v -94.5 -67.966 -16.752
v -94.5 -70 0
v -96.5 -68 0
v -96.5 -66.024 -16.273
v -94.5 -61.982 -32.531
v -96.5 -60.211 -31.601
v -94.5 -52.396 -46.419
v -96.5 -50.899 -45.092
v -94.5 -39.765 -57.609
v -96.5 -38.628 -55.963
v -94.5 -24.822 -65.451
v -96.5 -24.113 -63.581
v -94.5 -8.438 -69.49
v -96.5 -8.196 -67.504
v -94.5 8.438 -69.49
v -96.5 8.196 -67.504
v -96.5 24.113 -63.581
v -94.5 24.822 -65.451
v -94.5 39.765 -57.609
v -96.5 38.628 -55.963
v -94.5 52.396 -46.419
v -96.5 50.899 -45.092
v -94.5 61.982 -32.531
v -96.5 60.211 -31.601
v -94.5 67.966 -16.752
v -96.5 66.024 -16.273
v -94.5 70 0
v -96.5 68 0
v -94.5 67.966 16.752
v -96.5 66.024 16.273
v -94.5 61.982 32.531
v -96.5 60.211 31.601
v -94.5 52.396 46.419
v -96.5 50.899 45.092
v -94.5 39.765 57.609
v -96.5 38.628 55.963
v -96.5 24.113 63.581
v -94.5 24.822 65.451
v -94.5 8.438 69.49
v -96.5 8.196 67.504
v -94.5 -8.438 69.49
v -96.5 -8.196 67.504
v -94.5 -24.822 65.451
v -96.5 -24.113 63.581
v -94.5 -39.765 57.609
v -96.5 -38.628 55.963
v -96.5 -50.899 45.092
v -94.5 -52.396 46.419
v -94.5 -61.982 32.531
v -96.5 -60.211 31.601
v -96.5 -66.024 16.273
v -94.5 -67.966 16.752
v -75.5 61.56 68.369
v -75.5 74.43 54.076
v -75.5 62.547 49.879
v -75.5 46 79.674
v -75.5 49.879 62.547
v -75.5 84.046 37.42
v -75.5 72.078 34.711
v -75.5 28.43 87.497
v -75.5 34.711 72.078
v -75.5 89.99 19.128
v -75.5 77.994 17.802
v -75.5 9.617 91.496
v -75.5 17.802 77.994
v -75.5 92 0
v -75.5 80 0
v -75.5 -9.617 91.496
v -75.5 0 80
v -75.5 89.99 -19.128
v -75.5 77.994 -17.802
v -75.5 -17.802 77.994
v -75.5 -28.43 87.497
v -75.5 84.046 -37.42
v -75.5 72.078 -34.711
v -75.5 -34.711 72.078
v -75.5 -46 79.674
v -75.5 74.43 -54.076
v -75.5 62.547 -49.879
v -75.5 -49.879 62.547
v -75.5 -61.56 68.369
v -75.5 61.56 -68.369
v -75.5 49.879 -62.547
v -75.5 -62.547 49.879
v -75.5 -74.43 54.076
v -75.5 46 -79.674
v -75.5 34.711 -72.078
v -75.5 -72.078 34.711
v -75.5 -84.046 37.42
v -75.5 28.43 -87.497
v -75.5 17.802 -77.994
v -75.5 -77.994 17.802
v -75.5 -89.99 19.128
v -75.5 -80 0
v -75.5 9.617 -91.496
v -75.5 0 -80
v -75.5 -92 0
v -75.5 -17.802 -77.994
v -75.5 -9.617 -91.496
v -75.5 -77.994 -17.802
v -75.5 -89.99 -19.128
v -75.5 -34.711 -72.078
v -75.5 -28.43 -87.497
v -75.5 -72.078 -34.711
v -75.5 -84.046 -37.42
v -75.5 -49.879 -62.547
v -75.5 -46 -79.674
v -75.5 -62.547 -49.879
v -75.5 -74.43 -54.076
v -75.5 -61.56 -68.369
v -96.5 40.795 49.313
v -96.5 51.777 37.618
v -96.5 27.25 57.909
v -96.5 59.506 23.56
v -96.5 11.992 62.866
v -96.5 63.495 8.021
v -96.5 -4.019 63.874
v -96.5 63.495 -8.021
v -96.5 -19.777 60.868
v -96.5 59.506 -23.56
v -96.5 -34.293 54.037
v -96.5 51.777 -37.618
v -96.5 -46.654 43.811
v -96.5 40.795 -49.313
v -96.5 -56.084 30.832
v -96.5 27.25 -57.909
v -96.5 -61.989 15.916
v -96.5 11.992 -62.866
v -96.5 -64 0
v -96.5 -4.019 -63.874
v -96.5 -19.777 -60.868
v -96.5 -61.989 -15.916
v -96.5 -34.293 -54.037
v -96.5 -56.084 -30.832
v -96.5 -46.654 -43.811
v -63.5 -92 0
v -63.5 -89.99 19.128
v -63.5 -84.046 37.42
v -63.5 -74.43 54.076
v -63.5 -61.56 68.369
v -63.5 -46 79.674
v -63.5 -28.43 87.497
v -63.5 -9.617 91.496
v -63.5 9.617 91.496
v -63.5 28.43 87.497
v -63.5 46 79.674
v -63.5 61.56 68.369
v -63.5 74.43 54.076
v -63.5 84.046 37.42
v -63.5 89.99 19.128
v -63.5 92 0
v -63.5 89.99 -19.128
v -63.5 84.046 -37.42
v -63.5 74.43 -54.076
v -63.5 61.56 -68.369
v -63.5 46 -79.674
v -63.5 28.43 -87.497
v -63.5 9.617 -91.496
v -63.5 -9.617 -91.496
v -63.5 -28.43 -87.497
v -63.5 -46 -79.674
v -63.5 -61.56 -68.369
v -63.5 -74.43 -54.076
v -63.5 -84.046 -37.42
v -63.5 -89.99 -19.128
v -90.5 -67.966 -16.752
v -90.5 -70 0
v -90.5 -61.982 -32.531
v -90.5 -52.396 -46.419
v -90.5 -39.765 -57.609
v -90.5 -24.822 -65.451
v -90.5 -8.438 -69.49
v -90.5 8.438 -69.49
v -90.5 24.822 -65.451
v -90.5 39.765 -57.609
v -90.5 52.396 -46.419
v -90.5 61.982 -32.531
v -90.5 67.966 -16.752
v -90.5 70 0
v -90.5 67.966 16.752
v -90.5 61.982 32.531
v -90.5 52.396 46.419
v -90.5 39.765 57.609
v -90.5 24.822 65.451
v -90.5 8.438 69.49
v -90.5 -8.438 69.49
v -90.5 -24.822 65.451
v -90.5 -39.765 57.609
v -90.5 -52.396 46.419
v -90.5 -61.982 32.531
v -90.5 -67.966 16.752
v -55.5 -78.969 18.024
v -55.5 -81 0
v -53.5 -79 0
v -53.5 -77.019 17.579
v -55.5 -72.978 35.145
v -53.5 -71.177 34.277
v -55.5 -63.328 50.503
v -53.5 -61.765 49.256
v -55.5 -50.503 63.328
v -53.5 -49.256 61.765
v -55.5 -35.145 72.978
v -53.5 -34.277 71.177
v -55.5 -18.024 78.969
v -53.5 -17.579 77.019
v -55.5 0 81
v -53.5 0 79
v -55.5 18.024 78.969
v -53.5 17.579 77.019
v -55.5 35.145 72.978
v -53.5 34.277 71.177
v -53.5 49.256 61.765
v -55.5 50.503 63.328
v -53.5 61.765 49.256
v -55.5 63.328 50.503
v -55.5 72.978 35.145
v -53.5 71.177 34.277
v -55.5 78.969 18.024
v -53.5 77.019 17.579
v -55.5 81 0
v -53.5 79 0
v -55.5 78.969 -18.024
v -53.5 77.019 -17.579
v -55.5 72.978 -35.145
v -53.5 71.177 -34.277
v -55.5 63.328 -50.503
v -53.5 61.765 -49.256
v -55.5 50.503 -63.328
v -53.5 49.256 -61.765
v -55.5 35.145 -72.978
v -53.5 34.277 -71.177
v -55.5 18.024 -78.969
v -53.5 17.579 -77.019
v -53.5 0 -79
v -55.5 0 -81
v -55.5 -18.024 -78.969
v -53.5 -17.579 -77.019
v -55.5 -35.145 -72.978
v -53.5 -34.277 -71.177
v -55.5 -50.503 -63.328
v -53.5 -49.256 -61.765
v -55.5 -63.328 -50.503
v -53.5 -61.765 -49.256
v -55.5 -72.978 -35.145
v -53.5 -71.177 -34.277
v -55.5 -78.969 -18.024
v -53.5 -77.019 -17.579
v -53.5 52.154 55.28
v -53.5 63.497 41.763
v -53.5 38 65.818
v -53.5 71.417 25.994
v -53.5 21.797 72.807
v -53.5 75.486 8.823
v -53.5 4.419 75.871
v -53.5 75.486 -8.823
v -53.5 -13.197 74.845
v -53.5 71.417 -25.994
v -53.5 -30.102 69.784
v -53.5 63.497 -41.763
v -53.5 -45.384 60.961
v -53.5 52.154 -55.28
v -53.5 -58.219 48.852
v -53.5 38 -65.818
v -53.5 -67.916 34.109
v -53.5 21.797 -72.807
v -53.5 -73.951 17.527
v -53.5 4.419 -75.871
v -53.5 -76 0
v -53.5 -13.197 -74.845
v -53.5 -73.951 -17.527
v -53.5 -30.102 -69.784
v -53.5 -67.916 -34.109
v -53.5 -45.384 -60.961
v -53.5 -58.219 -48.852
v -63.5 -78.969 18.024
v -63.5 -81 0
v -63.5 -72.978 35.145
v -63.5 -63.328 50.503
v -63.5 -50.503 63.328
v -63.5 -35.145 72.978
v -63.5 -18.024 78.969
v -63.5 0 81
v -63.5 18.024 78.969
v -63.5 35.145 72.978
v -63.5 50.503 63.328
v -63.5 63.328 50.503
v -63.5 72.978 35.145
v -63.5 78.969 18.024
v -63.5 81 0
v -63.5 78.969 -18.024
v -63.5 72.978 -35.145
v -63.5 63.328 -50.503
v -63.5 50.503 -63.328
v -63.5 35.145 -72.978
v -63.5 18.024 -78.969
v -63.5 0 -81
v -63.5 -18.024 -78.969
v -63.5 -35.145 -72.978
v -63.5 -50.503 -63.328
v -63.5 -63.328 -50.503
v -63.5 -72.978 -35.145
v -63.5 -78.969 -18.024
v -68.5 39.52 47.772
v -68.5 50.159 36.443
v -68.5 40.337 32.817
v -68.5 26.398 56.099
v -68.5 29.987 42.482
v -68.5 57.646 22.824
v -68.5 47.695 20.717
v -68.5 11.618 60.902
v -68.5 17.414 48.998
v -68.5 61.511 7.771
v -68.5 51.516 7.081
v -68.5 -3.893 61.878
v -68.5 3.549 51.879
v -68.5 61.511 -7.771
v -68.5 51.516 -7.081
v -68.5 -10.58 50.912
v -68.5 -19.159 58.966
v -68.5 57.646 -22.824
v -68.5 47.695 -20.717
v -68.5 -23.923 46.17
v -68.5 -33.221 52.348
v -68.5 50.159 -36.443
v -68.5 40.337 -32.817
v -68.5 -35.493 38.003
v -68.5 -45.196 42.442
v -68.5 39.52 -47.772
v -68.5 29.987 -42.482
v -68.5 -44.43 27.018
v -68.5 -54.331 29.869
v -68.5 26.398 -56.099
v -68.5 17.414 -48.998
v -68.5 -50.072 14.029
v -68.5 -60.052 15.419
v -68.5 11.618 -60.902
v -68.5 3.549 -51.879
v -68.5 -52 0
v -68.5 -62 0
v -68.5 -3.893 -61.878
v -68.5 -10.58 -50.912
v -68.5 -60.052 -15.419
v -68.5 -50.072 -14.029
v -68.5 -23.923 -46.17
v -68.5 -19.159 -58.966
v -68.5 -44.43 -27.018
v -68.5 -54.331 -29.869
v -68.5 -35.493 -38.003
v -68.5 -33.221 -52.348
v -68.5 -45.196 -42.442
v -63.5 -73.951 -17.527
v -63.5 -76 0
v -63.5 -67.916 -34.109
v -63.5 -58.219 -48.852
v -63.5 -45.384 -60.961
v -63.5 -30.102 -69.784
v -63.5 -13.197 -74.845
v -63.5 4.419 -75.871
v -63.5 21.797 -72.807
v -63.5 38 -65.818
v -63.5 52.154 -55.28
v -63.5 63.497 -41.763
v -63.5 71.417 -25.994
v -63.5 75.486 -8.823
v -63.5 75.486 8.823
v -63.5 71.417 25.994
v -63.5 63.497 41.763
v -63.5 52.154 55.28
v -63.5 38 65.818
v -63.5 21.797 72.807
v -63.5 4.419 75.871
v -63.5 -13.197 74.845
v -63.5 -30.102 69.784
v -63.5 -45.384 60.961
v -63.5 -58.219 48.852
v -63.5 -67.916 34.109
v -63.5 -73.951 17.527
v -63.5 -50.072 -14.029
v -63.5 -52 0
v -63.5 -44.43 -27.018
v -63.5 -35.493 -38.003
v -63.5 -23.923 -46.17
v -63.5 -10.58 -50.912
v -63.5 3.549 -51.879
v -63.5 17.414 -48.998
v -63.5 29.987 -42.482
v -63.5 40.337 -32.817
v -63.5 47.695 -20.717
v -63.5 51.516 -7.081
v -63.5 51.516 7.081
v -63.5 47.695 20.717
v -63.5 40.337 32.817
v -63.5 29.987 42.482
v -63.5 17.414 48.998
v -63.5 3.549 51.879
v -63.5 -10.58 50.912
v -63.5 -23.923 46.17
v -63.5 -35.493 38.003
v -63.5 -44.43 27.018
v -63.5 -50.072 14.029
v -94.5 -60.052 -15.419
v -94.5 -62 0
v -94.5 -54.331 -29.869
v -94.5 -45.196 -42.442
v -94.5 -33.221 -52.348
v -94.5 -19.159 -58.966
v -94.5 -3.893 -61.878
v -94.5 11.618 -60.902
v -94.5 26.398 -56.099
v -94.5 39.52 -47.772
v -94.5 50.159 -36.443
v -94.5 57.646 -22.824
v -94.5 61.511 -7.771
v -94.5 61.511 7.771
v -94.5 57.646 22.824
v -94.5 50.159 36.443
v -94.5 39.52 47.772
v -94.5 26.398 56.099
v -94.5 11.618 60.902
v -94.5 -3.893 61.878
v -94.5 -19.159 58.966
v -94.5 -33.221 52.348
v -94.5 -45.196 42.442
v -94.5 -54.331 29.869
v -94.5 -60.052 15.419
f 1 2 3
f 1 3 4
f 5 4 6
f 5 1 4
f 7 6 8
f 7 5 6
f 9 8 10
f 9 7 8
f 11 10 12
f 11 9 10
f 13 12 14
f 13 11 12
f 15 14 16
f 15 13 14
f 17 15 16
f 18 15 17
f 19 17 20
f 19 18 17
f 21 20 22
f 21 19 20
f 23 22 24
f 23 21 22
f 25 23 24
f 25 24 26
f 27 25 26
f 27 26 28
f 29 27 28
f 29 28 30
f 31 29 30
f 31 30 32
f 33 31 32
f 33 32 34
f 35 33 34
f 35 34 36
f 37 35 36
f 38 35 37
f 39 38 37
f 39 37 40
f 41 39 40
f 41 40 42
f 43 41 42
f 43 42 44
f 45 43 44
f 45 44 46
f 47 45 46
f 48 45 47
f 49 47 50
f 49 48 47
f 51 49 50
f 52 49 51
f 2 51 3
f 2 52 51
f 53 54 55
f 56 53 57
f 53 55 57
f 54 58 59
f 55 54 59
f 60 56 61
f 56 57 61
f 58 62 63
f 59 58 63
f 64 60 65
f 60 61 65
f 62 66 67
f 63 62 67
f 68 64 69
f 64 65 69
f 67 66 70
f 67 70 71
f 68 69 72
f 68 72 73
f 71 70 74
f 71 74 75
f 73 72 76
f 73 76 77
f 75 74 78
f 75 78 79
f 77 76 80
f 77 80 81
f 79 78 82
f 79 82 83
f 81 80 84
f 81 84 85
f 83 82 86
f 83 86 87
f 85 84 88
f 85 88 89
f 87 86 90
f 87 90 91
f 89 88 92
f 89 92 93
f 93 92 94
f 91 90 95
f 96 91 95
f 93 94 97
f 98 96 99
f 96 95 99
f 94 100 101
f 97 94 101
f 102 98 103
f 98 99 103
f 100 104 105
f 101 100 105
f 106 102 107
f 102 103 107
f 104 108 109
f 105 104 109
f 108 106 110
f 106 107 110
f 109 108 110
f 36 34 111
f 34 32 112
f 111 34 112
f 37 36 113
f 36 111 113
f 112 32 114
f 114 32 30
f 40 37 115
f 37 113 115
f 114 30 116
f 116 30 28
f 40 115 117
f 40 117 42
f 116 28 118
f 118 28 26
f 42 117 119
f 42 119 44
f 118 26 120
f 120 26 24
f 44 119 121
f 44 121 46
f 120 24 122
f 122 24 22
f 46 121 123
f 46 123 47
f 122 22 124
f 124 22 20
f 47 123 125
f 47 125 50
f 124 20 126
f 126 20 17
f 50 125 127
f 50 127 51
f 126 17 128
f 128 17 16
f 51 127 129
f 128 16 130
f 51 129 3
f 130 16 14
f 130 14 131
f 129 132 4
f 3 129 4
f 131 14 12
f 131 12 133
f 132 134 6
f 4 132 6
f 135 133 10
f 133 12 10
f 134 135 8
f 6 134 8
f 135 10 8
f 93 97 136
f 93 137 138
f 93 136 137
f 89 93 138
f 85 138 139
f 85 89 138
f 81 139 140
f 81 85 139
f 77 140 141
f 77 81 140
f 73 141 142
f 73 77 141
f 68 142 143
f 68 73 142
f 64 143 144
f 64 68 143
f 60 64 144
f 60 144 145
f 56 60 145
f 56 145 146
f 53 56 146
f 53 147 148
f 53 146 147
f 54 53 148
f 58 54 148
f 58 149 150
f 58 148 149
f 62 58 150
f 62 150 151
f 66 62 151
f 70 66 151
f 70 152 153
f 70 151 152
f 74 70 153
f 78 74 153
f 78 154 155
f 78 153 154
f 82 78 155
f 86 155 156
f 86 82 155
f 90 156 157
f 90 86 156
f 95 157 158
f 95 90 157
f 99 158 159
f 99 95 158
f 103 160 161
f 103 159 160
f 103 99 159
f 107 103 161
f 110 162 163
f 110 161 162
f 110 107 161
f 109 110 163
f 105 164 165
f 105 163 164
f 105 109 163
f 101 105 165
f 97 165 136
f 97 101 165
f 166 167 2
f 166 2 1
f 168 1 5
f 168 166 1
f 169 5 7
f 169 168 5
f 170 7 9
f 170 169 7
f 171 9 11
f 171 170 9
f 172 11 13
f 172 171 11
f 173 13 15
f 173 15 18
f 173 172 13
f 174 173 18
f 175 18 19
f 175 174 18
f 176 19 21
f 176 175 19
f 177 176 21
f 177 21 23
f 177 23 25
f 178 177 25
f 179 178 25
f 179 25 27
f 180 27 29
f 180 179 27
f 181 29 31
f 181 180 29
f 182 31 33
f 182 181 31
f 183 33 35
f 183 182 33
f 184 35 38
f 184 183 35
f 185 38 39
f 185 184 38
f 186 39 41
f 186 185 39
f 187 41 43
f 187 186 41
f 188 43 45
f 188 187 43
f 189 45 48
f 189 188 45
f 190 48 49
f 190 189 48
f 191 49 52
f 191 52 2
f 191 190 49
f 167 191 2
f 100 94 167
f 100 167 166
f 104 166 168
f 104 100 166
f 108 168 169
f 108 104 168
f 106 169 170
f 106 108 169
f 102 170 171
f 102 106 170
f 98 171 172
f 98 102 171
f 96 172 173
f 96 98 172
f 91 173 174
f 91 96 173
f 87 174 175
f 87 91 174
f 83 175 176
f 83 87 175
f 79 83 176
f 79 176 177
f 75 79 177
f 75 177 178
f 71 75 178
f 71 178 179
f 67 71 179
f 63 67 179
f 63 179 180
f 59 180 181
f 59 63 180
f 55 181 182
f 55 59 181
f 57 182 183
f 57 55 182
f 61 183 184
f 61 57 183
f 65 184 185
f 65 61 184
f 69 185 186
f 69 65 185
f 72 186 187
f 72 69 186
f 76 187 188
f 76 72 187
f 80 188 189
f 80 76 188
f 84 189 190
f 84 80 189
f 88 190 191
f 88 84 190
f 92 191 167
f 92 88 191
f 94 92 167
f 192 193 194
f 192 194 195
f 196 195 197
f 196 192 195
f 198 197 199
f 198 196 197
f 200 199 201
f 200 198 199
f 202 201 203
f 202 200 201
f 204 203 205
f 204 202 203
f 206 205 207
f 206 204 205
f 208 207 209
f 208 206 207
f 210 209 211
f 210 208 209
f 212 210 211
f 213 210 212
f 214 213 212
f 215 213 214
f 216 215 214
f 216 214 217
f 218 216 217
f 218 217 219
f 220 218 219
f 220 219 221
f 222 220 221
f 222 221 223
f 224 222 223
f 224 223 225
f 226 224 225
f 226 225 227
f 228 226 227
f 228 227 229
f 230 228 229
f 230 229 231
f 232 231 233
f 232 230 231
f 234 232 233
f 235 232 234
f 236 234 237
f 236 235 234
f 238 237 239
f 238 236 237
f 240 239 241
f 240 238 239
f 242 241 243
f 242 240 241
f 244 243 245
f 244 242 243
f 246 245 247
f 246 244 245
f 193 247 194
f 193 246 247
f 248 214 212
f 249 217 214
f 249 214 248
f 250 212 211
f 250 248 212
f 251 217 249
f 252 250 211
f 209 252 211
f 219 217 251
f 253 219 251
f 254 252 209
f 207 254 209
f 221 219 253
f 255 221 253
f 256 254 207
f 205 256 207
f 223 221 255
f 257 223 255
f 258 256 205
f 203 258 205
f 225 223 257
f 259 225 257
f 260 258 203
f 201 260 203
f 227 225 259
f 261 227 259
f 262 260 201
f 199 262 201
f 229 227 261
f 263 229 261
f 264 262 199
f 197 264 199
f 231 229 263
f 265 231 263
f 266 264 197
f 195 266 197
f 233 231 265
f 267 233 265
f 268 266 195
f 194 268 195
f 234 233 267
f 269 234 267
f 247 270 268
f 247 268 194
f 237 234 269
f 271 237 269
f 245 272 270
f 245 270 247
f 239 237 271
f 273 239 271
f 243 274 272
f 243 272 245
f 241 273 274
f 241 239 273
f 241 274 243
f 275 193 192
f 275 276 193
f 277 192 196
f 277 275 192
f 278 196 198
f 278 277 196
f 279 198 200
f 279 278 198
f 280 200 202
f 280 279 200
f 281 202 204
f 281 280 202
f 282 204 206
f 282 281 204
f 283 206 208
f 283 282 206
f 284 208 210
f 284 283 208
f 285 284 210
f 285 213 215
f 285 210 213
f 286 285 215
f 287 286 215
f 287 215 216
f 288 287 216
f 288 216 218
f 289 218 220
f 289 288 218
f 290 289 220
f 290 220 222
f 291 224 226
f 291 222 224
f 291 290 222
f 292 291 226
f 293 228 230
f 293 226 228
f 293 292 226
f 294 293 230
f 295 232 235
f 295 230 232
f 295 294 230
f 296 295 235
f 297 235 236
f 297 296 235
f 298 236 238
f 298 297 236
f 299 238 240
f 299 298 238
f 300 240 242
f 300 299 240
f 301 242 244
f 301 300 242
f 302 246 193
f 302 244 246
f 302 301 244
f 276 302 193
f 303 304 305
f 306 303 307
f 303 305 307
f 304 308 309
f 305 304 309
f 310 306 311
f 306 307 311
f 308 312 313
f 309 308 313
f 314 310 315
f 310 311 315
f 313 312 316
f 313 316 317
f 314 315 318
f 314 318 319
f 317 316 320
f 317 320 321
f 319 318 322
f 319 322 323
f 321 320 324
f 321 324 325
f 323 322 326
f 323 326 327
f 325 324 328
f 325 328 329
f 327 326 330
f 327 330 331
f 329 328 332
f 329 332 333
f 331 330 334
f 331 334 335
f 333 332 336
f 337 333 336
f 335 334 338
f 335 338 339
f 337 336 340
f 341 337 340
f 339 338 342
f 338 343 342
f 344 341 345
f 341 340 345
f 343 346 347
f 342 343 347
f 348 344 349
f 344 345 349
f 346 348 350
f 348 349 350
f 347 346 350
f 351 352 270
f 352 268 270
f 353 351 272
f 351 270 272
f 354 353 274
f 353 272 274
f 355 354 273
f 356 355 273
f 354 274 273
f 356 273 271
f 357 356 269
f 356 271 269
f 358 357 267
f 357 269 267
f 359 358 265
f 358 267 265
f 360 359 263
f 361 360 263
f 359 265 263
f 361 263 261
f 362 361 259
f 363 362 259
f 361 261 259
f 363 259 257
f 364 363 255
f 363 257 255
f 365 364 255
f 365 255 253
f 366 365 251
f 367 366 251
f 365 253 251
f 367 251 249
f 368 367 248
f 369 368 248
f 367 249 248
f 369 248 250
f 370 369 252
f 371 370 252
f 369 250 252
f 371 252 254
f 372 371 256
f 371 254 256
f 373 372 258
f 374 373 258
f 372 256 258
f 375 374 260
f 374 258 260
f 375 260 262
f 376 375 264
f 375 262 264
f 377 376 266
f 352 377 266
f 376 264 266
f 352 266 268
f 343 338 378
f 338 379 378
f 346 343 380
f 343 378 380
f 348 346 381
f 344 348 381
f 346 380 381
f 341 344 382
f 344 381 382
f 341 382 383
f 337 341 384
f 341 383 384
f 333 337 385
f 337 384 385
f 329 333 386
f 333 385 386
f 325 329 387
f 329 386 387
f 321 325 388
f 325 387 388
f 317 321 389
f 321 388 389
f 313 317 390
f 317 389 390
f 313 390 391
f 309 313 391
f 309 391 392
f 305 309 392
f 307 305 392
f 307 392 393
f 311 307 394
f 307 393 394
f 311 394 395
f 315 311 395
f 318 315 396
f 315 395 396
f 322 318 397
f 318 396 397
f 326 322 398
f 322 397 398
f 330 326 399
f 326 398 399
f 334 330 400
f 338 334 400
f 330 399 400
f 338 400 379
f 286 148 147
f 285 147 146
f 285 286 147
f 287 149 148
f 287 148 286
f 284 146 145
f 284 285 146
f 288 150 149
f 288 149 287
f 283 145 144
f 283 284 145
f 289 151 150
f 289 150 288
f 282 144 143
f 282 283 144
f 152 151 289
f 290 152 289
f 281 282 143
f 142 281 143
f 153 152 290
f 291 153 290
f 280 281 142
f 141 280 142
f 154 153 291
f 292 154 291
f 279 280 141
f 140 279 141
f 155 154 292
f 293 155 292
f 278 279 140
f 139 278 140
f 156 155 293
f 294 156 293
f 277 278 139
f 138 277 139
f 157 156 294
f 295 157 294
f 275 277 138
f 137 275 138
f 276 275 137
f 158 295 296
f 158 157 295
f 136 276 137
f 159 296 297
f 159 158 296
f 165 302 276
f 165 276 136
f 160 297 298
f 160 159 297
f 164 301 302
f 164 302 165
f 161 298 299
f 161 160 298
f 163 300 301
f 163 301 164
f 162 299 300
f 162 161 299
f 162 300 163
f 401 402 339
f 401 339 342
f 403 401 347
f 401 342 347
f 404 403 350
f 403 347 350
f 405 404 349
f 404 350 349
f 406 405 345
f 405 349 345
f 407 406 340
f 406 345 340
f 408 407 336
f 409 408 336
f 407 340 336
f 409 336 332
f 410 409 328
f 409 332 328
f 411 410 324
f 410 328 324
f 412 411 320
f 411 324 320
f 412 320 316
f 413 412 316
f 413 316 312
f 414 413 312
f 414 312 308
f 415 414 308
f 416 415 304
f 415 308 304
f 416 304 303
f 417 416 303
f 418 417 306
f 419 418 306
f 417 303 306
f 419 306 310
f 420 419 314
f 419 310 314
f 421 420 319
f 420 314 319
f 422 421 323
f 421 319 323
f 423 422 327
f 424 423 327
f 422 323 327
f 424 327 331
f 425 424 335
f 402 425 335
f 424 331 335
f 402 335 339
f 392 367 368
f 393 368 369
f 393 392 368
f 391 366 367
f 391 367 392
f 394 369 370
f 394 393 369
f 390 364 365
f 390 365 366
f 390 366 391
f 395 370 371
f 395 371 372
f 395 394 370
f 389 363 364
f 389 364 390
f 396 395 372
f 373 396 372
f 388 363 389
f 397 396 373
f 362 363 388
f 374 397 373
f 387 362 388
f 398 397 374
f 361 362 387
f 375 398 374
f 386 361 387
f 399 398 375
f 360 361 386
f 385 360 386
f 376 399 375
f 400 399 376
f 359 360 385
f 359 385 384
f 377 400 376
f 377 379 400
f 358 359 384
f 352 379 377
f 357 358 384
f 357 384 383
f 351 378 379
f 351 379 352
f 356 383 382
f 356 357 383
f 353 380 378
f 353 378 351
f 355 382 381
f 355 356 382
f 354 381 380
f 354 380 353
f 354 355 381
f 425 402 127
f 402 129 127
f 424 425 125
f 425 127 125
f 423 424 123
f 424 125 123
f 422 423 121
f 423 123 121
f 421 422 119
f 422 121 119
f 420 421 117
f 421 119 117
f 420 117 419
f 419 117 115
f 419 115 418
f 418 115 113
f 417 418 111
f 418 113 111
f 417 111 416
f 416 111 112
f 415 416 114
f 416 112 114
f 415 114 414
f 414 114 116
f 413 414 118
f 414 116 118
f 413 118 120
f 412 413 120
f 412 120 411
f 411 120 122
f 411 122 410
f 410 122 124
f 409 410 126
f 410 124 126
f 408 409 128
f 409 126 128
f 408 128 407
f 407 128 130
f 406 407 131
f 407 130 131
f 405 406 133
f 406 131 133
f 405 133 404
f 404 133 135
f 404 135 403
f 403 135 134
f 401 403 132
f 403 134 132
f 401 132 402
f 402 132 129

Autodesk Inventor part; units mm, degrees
ref_plane "YZ Plane" through (0, 0, 0) normal (1, 0, 0) x (0, 1, 0)
ref_plane "XZ Plane" through (0, 0, 0) normal (0, 1, 0) x (-1, 0, 0)
ref_plane "XY Plane" through (0, 0, 0) normal (0, 0, 1) x (1, 0, 0)
sketch "Эскиз1" plane through (0, 0, 0) normal (0, 0, 1) x (1, 0, 0)
  line L0 (-63.5, -92) -> (-63.5, -81)
  line L1 (-63.5, -81) -> (-63.5, -92)
  line L2 (-75.5, -92) -> (-75.5, -80)
  line L3 (-96.5, -62) -> (-68.5, -62)
  line L4 (-68.5, -62) -> (-68.5, -52)
  line L5 (-68.5, -52) -> (-63.5, -52)
  line L6 (-63.5, -52) -> (-63.5, -76)
  line L7 (-63.5, -76) -> (-53.5, -76)
  line L8 (-53.5, -76) -> (-53.5, -81)
  line L9 (-63.5, -92) -> (-75.5, -92)
  line L10 (-53.5, -81) -> (-63.5, -81)
  line L11 (-96.5, -70) -> (-90.5, -70)
  line L12 (-90.5, -70) -> (-75.5, -80)
  line L13 (-96.5, -62) -> (-96.5, -70)
  line L14 (-115.8, 0) -> (19.3, 0) projected
  point P0 (0, 0)
  dimension "d0" = 12
  dimension "d1" = 5
  dimension "d2" = 10
  dimension "d3" = 30
  dimension "d5" = 12
  dimension "d7" = 10
  dimension "d8" = 6
  dimension "d9" = 5
  dimension "d10" = 8
  dimension "d11" = 21
  dimension "d13" = 70
revolve "Вращение1" add sketch "Эскиз1" angle 360 about axis through (-10, 0, 0) along (1, 0, 0)
chamfer "Фаска1" distance 2 angle 45 1 edges at (-96.5, 70, 0)
chamfer "Фаска2" distance 2 angle 45 1 edges at (-96.5, 62, 0)
chamfer "Фаска3" distance 2 angle 45 1 edges at (-53.5, 81, 0)
properties part number "2 крышка"
